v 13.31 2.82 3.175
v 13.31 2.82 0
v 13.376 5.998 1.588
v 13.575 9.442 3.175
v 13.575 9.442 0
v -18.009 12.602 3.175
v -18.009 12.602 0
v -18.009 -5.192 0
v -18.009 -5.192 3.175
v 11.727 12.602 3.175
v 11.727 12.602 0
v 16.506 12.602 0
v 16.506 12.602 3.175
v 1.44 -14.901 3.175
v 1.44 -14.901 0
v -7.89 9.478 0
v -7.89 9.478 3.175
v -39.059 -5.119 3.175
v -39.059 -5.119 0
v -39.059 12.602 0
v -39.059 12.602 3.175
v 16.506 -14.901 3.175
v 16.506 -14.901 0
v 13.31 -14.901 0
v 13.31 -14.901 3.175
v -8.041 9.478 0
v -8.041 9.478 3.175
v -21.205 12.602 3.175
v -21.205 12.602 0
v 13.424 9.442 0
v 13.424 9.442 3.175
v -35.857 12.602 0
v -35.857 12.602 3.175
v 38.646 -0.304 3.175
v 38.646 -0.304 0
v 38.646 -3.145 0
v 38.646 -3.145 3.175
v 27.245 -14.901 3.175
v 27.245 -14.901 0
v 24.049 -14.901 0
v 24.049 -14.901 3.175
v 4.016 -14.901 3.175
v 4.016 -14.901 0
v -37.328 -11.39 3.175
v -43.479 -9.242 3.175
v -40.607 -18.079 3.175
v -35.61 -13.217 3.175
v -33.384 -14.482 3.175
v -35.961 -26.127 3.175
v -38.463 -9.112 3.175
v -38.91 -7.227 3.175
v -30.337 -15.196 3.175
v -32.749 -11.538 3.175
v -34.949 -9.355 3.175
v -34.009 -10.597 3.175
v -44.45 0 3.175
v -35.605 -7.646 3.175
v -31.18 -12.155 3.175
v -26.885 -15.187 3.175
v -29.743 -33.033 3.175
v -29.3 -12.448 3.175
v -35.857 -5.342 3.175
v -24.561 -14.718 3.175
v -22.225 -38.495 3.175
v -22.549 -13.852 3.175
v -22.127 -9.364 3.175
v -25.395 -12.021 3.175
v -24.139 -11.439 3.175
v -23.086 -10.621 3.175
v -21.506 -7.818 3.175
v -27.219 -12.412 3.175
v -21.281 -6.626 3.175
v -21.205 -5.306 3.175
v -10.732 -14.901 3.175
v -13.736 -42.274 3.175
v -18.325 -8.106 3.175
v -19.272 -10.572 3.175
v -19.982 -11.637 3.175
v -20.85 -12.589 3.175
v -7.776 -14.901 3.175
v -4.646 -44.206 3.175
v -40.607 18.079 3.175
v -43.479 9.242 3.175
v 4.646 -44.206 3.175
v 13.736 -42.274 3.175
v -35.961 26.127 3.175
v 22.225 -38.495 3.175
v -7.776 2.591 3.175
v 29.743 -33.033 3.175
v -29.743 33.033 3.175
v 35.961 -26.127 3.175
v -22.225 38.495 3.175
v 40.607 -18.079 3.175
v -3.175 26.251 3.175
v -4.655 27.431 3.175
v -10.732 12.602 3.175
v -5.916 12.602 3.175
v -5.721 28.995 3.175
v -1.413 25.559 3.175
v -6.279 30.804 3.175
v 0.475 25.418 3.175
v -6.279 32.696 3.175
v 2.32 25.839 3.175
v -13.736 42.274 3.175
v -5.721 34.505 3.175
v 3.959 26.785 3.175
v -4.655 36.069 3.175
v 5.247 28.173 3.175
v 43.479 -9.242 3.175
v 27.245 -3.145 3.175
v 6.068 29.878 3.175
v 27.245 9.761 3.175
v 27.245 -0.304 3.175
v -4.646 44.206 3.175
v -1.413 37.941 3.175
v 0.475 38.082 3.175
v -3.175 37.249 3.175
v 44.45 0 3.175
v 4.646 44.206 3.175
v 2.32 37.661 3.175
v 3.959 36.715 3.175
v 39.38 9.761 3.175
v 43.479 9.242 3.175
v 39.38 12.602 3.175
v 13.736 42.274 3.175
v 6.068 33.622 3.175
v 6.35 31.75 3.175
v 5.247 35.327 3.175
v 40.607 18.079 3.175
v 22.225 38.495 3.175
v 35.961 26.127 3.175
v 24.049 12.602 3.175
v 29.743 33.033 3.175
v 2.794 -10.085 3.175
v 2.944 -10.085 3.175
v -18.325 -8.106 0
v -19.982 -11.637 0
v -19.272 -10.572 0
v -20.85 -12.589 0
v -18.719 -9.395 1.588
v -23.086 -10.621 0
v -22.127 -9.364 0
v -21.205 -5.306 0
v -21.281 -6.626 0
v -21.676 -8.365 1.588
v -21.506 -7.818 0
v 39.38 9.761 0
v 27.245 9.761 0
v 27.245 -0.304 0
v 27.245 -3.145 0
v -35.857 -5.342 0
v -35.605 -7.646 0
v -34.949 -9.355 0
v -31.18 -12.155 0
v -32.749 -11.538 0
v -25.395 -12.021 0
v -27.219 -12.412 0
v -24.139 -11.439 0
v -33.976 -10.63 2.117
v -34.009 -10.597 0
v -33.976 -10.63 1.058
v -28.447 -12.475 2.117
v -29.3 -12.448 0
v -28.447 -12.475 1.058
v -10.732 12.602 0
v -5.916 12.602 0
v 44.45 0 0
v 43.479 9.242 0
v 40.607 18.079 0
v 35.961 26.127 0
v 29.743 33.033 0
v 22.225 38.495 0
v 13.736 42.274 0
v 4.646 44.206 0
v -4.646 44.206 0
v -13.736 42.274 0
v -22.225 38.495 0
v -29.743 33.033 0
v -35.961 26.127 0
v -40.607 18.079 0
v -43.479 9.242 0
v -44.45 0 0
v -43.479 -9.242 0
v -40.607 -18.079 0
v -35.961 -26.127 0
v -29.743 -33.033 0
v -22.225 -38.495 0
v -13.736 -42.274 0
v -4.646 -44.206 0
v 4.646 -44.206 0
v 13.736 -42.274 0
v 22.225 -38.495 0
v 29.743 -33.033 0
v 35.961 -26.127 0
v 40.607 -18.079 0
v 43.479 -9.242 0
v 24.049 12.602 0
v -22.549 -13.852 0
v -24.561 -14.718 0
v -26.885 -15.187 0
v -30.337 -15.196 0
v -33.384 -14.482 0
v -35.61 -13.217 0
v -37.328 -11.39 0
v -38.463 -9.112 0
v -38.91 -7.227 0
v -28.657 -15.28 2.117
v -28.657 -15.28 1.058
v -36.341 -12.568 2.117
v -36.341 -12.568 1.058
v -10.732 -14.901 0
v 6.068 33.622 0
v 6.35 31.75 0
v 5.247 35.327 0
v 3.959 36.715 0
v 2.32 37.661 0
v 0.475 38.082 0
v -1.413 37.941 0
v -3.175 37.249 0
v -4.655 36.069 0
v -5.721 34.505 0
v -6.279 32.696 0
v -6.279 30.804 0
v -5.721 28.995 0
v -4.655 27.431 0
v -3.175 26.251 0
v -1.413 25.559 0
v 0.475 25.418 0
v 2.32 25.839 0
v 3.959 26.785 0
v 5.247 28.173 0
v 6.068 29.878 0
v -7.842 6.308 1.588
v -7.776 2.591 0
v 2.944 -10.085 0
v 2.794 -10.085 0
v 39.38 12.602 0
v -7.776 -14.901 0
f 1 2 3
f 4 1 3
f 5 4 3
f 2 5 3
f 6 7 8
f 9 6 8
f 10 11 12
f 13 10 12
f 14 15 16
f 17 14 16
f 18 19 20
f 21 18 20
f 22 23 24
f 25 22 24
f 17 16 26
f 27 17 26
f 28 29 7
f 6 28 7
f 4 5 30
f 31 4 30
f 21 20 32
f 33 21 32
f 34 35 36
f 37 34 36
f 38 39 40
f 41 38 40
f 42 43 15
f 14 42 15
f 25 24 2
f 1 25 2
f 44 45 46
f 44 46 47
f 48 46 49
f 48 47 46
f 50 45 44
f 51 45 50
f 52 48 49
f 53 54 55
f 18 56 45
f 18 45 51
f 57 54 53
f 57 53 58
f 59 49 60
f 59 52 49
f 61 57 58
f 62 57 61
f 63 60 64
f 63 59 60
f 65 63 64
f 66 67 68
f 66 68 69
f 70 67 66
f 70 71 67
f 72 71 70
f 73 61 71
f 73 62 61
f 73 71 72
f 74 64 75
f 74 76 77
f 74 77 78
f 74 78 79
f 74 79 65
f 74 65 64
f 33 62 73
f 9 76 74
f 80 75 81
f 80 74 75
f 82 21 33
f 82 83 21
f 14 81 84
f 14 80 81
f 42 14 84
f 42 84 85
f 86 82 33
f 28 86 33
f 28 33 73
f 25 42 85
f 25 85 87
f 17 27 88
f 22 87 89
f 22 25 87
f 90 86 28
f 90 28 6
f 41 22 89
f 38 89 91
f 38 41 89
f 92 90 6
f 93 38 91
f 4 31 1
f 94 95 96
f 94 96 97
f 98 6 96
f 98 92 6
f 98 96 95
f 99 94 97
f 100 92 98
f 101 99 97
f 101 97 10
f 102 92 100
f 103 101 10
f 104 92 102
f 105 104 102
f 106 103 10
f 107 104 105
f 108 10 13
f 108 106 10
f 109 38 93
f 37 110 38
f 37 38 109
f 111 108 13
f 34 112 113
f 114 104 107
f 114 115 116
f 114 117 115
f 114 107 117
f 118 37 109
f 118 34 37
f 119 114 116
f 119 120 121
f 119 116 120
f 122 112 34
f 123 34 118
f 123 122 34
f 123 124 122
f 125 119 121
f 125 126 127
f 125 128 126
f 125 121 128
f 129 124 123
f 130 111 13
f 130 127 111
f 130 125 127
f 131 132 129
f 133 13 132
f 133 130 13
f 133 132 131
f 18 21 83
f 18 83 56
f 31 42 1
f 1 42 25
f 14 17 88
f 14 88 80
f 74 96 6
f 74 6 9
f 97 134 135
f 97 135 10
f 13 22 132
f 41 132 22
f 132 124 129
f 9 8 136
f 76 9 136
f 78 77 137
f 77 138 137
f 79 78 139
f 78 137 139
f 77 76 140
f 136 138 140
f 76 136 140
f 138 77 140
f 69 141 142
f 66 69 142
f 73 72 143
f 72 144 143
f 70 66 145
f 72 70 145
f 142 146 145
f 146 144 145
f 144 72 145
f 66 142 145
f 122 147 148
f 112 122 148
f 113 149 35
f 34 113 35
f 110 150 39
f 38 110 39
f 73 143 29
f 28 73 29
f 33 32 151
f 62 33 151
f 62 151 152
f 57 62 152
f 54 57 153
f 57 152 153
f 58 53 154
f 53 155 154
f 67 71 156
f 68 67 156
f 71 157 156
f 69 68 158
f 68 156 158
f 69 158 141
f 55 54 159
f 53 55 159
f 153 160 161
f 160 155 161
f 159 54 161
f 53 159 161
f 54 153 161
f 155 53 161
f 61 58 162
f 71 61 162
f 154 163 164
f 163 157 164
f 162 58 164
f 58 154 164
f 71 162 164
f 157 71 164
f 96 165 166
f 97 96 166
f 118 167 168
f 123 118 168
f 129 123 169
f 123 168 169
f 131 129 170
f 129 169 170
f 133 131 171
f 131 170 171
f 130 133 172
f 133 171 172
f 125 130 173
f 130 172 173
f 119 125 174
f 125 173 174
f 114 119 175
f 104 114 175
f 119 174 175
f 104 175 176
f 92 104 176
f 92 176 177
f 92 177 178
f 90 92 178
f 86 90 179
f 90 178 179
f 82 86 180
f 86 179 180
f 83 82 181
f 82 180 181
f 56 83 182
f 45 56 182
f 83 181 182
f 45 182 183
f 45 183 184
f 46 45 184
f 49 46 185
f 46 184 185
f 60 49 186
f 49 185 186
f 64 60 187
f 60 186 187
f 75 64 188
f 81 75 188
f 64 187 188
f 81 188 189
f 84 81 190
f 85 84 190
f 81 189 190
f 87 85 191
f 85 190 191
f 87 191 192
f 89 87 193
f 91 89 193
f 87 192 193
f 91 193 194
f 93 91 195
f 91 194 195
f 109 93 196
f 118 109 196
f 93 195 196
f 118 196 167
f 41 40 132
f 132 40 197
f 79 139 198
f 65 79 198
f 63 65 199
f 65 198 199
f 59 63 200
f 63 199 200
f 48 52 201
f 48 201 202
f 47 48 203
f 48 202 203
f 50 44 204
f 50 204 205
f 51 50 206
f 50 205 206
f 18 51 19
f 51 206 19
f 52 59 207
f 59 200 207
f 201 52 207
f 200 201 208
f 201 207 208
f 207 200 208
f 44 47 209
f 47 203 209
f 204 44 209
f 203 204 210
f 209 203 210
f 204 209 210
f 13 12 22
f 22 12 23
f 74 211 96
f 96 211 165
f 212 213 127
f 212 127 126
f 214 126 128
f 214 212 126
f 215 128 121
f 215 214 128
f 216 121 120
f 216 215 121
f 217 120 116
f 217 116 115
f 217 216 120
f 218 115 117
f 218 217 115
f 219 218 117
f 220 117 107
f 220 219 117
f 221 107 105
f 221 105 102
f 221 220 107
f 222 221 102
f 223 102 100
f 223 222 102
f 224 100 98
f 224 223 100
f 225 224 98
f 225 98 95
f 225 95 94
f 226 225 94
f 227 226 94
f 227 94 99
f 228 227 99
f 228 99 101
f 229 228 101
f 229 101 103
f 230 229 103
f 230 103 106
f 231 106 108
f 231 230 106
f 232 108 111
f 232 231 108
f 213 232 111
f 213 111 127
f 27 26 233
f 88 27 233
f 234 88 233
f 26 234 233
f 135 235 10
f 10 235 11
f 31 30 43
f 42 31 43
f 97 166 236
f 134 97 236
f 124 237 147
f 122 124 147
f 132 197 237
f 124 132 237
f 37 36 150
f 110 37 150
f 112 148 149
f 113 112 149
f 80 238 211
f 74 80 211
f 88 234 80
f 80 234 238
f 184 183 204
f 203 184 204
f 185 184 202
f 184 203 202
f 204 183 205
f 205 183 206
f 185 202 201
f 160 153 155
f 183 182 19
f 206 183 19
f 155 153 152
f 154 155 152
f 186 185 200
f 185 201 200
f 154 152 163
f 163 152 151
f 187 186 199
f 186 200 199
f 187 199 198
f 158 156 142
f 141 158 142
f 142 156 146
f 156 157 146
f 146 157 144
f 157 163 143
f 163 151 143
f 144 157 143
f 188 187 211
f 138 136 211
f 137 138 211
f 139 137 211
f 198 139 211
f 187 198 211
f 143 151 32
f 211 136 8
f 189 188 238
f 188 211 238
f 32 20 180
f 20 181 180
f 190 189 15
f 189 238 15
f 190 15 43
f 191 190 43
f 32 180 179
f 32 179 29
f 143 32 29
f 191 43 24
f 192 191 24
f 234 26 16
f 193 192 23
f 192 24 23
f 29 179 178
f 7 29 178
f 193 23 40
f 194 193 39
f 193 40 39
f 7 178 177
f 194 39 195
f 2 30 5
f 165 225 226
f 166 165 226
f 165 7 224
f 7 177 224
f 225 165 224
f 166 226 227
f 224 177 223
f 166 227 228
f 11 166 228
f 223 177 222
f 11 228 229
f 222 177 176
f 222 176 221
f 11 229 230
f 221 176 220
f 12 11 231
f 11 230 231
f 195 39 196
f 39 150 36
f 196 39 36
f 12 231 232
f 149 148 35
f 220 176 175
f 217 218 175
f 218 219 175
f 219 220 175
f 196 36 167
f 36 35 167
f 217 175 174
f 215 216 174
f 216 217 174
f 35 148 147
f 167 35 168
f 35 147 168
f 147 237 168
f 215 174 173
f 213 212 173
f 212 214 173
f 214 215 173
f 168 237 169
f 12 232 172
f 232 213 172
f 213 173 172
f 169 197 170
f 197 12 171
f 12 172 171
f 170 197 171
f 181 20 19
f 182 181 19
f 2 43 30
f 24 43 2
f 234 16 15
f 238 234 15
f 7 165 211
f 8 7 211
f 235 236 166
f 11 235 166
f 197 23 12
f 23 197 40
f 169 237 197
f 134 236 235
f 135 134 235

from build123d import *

# Parameters (mm, degrees)
F0_R     = 44.45
F0_R_2   = 6.35
F1_DEPTH = 3.175


with BuildPart() as f1:
    # F0 (on Top) → F1 (new body)
    with BuildSketch(Plane.XY):
        Circle(F0_R)
        with BuildLine():
            Line((-21.2053465663, 12.6017319805), (-18.0090443844, 12.6017319805))
            Line((-18.0090443844, 12.6017319805), (-18.0090443844, -5.1916187724))
            add(Edge.make_bspline(
                [(-18.0090443844, -5.1916187724), (-18.0090443844, -9.8987907239), (-20.8502018794, -12.5894631821)],
                knots=[0, 0, 0, 1, 1, 1], degree=2))
            add(Edge.make_bspline(
                [(-20.8502018794, -12.5894631821), (-23.6913593745, -15.2801356403), (-28.6573655893, -15.2801356403)],
                knots=[0, 0, 0, 1, 1, 1], degree=2))
            add(Edge.make_bspline(
                [(-28.6573655893, -15.2801356403), (-33.6233718042, -15.2801356403), (-36.341131569, -12.568395277)],
                knots=[0, 0, 0, 1, 1, 1], degree=2))
            add(Edge.make_bspline(
                [(-36.341131569, -12.568395277), (-39.0588913339, -9.8566549136), (-39.0588913339, -5.1193859547)],
                knots=[0, 0, 0, 1, 1, 1], degree=2))
            Line((-39.0588913339, -5.1193859547), (-39.0588913339, 12.6017319805))
            Line((-39.0588913339, 12.6017319805), (-35.8565697505, 12.6017319805))
            Line((-35.8565697505, 12.6017319805), (-35.8565697505, -5.3421038092))
            add(Edge.make_bspline(
                [(-35.8565697505, -5.3421038092), (-35.8565697505, -8.7852014515), (-33.9755067903, -10.6301480028)],
                knots=[0, 0, 0, 1, 1, 1], degree=2))
            add(Edge.make_bspline(
                [(-33.9755067903, -10.6301480028), (-32.0944438301, -12.4750945541), (-28.4466865378, -12.4750945541)],
                knots=[0, 0, 0, 1, 1, 1], degree=2))
            add(Edge.make_bspline(
                [(-28.4466865378, -12.4750945541), (-24.9674724866, -12.4750945541), (-23.0864095265, -10.6211189006)],
                knots=[0, 0, 0, 1, 1, 1], degree=2))
            add(Edge.make_bspline(
                [(-23.0864095265, -10.6211189006), (-21.2053465663, -8.7671432471), (-21.2053465663, -5.3059874003)],
                knots=[0, 0, 0, 1, 1, 1], degree=2))
            Line((-21.2053465663, -5.3059874003), (-21.2053465663, 12.6017319805))
        make_face(mode=Mode.SUBTRACT)
        with BuildLine():
            Line((4.0159456036, -14.9009133476), (1.4396417734, -14.9009133476))
            Line((1.4396417734, -14.9009133476), (-7.890430509, 9.4776626162))
            Line((-7.890430509, 9.4776626162), (-8.0409155459, 9.4776626162))
            add(Edge.make_bspline(
                [(-8.0409155459, 9.4776626162), (-7.7760618811, 6.5823305079), (-7.7760618811, 2.5914673316)],
                knots=[0, 0, 0, 1, 1, 1], degree=2))
            Line((-7.7760618811, 2.5914673316), (-7.7760618811, -14.9009133476))
            Line((-7.7760618811, -14.9009133476), (-10.7315880041, -14.9009133476))
            Line((-10.7315880041, -14.9009133476), (-10.7315880041, 12.6017319805))
            Line((-10.7315880041, 12.6017319805), (-5.916066826, 12.6017319805))
            Line((-5.916066826, 12.6017319805), (2.7940071047, -10.0853921695))
            Line((2.7940071047, -10.0853921695), (2.9444921415, -10.0853921695))
            Line((2.9444921415, -10.0853921695), (11.72679889, 12.6017319805))
            Line((11.72679889, 12.6017319805), (16.5062036592, 12.6017319805))
            Line((16.5062036592, 12.6017319805), (16.5062036592, -14.9009133476))
            Line((16.5062036592, -14.9009133476), (13.3099014773, -14.9009133476))
            Line((13.3099014773, -14.9009133476), (13.3099014773, 2.8202045876))
            add(Edge.make_bspline(
                [(13.3099014773, 2.8202045876), (13.3099014773, 5.8660217327), (13.574755142, 9.4415462074)],
                knots=[0, 0, 0, 1, 1, 1], degree=2))
            Line((13.574755142, 9.4415462074), (13.4242701052, 9.4415462074))
            Line((13.4242701052, 9.4415462074), (4.0159456036, -14.9009133476))
        make_face(mode=Mode.SUBTRACT)
        Polygon((27.2448158862, -3.1450222717), (27.2448158862, -14.9009133476), (24.0485137043, -14.9009133476), (24.0485137043, 12.6017319805), (39.3799292548, 12.6017319805), (39.3799292548, 9.7605744854), (27.2448158862, 9.7605744854), (27.2448158862, -0.3038647767), (38.6455622752, -0.3038647767), (38.6455622752, -3.1450222717), align=None, mode=Mode.SUBTRACT)
        with Locations((0, 31.75)):
            Circle(F0_R_2, mode=Mode.SUBTRACT)
    extrude(amount=F1_DEPTH)


solid = f1.part
